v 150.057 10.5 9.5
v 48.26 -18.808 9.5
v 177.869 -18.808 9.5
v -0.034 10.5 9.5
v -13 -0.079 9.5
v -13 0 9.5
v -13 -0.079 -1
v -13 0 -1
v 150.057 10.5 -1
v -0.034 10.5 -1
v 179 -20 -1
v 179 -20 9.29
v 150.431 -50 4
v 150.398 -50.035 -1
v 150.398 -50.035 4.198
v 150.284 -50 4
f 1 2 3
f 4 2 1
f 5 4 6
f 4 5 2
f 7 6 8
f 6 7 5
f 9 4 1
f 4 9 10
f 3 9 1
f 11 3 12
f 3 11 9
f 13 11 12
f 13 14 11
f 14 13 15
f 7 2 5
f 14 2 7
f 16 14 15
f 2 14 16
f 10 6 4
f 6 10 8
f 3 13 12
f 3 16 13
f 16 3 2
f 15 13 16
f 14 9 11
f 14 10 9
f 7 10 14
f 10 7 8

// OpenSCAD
module headstock (){
  difference() {
    translate ([(192-29)-13,0,0]){
     difference () {
         translate ([0,-20,0]) difference () {
             translate ([-192+29,-30.5,-1]) cube([192,61,1]);
             translate ([29,0,-2]) rotate([0,0,43.5]) cube([50,50,3]);
             translate ([29,0,-2]) rotate([0,0,-133.6]) cube([50,50,3]);
         }
        translate ([-192,-55,-2]) rotate ([0,0,-17]) cube([192,61,3]);
     }
    }
  translate ([-13,0,-2]) rotate ([0,0,39]) cube([20,20,3]);
  }
}

module case (){
  difference() {
    translate ([(192-29)-13,0,0]){
     difference () {
         translate ([0,-20,0]) difference () {
             translate ([-192+29,-30.5,0]) cube([192,61,9.5]);
             translate ([29,0,-1]) rotate([0,0,43.5]) cube([50,50,11]);
             translate ([29,0,-1]) rotate([0,0,-133.6]) cube([50,50,11]);
         }
        translate ([-192,-55,-1]) rotate ([0,0,-17]) cube([192,61,11]);
     }
    }
  translate ([-13,0,-1]) rotate ([0,0,39]) cube([20,20,11]);
  translate ([0,-50,+4]) rotate ([10,0,0]) cube([200,50,11]);
  }
}
color("Pink") case();
headstock();
